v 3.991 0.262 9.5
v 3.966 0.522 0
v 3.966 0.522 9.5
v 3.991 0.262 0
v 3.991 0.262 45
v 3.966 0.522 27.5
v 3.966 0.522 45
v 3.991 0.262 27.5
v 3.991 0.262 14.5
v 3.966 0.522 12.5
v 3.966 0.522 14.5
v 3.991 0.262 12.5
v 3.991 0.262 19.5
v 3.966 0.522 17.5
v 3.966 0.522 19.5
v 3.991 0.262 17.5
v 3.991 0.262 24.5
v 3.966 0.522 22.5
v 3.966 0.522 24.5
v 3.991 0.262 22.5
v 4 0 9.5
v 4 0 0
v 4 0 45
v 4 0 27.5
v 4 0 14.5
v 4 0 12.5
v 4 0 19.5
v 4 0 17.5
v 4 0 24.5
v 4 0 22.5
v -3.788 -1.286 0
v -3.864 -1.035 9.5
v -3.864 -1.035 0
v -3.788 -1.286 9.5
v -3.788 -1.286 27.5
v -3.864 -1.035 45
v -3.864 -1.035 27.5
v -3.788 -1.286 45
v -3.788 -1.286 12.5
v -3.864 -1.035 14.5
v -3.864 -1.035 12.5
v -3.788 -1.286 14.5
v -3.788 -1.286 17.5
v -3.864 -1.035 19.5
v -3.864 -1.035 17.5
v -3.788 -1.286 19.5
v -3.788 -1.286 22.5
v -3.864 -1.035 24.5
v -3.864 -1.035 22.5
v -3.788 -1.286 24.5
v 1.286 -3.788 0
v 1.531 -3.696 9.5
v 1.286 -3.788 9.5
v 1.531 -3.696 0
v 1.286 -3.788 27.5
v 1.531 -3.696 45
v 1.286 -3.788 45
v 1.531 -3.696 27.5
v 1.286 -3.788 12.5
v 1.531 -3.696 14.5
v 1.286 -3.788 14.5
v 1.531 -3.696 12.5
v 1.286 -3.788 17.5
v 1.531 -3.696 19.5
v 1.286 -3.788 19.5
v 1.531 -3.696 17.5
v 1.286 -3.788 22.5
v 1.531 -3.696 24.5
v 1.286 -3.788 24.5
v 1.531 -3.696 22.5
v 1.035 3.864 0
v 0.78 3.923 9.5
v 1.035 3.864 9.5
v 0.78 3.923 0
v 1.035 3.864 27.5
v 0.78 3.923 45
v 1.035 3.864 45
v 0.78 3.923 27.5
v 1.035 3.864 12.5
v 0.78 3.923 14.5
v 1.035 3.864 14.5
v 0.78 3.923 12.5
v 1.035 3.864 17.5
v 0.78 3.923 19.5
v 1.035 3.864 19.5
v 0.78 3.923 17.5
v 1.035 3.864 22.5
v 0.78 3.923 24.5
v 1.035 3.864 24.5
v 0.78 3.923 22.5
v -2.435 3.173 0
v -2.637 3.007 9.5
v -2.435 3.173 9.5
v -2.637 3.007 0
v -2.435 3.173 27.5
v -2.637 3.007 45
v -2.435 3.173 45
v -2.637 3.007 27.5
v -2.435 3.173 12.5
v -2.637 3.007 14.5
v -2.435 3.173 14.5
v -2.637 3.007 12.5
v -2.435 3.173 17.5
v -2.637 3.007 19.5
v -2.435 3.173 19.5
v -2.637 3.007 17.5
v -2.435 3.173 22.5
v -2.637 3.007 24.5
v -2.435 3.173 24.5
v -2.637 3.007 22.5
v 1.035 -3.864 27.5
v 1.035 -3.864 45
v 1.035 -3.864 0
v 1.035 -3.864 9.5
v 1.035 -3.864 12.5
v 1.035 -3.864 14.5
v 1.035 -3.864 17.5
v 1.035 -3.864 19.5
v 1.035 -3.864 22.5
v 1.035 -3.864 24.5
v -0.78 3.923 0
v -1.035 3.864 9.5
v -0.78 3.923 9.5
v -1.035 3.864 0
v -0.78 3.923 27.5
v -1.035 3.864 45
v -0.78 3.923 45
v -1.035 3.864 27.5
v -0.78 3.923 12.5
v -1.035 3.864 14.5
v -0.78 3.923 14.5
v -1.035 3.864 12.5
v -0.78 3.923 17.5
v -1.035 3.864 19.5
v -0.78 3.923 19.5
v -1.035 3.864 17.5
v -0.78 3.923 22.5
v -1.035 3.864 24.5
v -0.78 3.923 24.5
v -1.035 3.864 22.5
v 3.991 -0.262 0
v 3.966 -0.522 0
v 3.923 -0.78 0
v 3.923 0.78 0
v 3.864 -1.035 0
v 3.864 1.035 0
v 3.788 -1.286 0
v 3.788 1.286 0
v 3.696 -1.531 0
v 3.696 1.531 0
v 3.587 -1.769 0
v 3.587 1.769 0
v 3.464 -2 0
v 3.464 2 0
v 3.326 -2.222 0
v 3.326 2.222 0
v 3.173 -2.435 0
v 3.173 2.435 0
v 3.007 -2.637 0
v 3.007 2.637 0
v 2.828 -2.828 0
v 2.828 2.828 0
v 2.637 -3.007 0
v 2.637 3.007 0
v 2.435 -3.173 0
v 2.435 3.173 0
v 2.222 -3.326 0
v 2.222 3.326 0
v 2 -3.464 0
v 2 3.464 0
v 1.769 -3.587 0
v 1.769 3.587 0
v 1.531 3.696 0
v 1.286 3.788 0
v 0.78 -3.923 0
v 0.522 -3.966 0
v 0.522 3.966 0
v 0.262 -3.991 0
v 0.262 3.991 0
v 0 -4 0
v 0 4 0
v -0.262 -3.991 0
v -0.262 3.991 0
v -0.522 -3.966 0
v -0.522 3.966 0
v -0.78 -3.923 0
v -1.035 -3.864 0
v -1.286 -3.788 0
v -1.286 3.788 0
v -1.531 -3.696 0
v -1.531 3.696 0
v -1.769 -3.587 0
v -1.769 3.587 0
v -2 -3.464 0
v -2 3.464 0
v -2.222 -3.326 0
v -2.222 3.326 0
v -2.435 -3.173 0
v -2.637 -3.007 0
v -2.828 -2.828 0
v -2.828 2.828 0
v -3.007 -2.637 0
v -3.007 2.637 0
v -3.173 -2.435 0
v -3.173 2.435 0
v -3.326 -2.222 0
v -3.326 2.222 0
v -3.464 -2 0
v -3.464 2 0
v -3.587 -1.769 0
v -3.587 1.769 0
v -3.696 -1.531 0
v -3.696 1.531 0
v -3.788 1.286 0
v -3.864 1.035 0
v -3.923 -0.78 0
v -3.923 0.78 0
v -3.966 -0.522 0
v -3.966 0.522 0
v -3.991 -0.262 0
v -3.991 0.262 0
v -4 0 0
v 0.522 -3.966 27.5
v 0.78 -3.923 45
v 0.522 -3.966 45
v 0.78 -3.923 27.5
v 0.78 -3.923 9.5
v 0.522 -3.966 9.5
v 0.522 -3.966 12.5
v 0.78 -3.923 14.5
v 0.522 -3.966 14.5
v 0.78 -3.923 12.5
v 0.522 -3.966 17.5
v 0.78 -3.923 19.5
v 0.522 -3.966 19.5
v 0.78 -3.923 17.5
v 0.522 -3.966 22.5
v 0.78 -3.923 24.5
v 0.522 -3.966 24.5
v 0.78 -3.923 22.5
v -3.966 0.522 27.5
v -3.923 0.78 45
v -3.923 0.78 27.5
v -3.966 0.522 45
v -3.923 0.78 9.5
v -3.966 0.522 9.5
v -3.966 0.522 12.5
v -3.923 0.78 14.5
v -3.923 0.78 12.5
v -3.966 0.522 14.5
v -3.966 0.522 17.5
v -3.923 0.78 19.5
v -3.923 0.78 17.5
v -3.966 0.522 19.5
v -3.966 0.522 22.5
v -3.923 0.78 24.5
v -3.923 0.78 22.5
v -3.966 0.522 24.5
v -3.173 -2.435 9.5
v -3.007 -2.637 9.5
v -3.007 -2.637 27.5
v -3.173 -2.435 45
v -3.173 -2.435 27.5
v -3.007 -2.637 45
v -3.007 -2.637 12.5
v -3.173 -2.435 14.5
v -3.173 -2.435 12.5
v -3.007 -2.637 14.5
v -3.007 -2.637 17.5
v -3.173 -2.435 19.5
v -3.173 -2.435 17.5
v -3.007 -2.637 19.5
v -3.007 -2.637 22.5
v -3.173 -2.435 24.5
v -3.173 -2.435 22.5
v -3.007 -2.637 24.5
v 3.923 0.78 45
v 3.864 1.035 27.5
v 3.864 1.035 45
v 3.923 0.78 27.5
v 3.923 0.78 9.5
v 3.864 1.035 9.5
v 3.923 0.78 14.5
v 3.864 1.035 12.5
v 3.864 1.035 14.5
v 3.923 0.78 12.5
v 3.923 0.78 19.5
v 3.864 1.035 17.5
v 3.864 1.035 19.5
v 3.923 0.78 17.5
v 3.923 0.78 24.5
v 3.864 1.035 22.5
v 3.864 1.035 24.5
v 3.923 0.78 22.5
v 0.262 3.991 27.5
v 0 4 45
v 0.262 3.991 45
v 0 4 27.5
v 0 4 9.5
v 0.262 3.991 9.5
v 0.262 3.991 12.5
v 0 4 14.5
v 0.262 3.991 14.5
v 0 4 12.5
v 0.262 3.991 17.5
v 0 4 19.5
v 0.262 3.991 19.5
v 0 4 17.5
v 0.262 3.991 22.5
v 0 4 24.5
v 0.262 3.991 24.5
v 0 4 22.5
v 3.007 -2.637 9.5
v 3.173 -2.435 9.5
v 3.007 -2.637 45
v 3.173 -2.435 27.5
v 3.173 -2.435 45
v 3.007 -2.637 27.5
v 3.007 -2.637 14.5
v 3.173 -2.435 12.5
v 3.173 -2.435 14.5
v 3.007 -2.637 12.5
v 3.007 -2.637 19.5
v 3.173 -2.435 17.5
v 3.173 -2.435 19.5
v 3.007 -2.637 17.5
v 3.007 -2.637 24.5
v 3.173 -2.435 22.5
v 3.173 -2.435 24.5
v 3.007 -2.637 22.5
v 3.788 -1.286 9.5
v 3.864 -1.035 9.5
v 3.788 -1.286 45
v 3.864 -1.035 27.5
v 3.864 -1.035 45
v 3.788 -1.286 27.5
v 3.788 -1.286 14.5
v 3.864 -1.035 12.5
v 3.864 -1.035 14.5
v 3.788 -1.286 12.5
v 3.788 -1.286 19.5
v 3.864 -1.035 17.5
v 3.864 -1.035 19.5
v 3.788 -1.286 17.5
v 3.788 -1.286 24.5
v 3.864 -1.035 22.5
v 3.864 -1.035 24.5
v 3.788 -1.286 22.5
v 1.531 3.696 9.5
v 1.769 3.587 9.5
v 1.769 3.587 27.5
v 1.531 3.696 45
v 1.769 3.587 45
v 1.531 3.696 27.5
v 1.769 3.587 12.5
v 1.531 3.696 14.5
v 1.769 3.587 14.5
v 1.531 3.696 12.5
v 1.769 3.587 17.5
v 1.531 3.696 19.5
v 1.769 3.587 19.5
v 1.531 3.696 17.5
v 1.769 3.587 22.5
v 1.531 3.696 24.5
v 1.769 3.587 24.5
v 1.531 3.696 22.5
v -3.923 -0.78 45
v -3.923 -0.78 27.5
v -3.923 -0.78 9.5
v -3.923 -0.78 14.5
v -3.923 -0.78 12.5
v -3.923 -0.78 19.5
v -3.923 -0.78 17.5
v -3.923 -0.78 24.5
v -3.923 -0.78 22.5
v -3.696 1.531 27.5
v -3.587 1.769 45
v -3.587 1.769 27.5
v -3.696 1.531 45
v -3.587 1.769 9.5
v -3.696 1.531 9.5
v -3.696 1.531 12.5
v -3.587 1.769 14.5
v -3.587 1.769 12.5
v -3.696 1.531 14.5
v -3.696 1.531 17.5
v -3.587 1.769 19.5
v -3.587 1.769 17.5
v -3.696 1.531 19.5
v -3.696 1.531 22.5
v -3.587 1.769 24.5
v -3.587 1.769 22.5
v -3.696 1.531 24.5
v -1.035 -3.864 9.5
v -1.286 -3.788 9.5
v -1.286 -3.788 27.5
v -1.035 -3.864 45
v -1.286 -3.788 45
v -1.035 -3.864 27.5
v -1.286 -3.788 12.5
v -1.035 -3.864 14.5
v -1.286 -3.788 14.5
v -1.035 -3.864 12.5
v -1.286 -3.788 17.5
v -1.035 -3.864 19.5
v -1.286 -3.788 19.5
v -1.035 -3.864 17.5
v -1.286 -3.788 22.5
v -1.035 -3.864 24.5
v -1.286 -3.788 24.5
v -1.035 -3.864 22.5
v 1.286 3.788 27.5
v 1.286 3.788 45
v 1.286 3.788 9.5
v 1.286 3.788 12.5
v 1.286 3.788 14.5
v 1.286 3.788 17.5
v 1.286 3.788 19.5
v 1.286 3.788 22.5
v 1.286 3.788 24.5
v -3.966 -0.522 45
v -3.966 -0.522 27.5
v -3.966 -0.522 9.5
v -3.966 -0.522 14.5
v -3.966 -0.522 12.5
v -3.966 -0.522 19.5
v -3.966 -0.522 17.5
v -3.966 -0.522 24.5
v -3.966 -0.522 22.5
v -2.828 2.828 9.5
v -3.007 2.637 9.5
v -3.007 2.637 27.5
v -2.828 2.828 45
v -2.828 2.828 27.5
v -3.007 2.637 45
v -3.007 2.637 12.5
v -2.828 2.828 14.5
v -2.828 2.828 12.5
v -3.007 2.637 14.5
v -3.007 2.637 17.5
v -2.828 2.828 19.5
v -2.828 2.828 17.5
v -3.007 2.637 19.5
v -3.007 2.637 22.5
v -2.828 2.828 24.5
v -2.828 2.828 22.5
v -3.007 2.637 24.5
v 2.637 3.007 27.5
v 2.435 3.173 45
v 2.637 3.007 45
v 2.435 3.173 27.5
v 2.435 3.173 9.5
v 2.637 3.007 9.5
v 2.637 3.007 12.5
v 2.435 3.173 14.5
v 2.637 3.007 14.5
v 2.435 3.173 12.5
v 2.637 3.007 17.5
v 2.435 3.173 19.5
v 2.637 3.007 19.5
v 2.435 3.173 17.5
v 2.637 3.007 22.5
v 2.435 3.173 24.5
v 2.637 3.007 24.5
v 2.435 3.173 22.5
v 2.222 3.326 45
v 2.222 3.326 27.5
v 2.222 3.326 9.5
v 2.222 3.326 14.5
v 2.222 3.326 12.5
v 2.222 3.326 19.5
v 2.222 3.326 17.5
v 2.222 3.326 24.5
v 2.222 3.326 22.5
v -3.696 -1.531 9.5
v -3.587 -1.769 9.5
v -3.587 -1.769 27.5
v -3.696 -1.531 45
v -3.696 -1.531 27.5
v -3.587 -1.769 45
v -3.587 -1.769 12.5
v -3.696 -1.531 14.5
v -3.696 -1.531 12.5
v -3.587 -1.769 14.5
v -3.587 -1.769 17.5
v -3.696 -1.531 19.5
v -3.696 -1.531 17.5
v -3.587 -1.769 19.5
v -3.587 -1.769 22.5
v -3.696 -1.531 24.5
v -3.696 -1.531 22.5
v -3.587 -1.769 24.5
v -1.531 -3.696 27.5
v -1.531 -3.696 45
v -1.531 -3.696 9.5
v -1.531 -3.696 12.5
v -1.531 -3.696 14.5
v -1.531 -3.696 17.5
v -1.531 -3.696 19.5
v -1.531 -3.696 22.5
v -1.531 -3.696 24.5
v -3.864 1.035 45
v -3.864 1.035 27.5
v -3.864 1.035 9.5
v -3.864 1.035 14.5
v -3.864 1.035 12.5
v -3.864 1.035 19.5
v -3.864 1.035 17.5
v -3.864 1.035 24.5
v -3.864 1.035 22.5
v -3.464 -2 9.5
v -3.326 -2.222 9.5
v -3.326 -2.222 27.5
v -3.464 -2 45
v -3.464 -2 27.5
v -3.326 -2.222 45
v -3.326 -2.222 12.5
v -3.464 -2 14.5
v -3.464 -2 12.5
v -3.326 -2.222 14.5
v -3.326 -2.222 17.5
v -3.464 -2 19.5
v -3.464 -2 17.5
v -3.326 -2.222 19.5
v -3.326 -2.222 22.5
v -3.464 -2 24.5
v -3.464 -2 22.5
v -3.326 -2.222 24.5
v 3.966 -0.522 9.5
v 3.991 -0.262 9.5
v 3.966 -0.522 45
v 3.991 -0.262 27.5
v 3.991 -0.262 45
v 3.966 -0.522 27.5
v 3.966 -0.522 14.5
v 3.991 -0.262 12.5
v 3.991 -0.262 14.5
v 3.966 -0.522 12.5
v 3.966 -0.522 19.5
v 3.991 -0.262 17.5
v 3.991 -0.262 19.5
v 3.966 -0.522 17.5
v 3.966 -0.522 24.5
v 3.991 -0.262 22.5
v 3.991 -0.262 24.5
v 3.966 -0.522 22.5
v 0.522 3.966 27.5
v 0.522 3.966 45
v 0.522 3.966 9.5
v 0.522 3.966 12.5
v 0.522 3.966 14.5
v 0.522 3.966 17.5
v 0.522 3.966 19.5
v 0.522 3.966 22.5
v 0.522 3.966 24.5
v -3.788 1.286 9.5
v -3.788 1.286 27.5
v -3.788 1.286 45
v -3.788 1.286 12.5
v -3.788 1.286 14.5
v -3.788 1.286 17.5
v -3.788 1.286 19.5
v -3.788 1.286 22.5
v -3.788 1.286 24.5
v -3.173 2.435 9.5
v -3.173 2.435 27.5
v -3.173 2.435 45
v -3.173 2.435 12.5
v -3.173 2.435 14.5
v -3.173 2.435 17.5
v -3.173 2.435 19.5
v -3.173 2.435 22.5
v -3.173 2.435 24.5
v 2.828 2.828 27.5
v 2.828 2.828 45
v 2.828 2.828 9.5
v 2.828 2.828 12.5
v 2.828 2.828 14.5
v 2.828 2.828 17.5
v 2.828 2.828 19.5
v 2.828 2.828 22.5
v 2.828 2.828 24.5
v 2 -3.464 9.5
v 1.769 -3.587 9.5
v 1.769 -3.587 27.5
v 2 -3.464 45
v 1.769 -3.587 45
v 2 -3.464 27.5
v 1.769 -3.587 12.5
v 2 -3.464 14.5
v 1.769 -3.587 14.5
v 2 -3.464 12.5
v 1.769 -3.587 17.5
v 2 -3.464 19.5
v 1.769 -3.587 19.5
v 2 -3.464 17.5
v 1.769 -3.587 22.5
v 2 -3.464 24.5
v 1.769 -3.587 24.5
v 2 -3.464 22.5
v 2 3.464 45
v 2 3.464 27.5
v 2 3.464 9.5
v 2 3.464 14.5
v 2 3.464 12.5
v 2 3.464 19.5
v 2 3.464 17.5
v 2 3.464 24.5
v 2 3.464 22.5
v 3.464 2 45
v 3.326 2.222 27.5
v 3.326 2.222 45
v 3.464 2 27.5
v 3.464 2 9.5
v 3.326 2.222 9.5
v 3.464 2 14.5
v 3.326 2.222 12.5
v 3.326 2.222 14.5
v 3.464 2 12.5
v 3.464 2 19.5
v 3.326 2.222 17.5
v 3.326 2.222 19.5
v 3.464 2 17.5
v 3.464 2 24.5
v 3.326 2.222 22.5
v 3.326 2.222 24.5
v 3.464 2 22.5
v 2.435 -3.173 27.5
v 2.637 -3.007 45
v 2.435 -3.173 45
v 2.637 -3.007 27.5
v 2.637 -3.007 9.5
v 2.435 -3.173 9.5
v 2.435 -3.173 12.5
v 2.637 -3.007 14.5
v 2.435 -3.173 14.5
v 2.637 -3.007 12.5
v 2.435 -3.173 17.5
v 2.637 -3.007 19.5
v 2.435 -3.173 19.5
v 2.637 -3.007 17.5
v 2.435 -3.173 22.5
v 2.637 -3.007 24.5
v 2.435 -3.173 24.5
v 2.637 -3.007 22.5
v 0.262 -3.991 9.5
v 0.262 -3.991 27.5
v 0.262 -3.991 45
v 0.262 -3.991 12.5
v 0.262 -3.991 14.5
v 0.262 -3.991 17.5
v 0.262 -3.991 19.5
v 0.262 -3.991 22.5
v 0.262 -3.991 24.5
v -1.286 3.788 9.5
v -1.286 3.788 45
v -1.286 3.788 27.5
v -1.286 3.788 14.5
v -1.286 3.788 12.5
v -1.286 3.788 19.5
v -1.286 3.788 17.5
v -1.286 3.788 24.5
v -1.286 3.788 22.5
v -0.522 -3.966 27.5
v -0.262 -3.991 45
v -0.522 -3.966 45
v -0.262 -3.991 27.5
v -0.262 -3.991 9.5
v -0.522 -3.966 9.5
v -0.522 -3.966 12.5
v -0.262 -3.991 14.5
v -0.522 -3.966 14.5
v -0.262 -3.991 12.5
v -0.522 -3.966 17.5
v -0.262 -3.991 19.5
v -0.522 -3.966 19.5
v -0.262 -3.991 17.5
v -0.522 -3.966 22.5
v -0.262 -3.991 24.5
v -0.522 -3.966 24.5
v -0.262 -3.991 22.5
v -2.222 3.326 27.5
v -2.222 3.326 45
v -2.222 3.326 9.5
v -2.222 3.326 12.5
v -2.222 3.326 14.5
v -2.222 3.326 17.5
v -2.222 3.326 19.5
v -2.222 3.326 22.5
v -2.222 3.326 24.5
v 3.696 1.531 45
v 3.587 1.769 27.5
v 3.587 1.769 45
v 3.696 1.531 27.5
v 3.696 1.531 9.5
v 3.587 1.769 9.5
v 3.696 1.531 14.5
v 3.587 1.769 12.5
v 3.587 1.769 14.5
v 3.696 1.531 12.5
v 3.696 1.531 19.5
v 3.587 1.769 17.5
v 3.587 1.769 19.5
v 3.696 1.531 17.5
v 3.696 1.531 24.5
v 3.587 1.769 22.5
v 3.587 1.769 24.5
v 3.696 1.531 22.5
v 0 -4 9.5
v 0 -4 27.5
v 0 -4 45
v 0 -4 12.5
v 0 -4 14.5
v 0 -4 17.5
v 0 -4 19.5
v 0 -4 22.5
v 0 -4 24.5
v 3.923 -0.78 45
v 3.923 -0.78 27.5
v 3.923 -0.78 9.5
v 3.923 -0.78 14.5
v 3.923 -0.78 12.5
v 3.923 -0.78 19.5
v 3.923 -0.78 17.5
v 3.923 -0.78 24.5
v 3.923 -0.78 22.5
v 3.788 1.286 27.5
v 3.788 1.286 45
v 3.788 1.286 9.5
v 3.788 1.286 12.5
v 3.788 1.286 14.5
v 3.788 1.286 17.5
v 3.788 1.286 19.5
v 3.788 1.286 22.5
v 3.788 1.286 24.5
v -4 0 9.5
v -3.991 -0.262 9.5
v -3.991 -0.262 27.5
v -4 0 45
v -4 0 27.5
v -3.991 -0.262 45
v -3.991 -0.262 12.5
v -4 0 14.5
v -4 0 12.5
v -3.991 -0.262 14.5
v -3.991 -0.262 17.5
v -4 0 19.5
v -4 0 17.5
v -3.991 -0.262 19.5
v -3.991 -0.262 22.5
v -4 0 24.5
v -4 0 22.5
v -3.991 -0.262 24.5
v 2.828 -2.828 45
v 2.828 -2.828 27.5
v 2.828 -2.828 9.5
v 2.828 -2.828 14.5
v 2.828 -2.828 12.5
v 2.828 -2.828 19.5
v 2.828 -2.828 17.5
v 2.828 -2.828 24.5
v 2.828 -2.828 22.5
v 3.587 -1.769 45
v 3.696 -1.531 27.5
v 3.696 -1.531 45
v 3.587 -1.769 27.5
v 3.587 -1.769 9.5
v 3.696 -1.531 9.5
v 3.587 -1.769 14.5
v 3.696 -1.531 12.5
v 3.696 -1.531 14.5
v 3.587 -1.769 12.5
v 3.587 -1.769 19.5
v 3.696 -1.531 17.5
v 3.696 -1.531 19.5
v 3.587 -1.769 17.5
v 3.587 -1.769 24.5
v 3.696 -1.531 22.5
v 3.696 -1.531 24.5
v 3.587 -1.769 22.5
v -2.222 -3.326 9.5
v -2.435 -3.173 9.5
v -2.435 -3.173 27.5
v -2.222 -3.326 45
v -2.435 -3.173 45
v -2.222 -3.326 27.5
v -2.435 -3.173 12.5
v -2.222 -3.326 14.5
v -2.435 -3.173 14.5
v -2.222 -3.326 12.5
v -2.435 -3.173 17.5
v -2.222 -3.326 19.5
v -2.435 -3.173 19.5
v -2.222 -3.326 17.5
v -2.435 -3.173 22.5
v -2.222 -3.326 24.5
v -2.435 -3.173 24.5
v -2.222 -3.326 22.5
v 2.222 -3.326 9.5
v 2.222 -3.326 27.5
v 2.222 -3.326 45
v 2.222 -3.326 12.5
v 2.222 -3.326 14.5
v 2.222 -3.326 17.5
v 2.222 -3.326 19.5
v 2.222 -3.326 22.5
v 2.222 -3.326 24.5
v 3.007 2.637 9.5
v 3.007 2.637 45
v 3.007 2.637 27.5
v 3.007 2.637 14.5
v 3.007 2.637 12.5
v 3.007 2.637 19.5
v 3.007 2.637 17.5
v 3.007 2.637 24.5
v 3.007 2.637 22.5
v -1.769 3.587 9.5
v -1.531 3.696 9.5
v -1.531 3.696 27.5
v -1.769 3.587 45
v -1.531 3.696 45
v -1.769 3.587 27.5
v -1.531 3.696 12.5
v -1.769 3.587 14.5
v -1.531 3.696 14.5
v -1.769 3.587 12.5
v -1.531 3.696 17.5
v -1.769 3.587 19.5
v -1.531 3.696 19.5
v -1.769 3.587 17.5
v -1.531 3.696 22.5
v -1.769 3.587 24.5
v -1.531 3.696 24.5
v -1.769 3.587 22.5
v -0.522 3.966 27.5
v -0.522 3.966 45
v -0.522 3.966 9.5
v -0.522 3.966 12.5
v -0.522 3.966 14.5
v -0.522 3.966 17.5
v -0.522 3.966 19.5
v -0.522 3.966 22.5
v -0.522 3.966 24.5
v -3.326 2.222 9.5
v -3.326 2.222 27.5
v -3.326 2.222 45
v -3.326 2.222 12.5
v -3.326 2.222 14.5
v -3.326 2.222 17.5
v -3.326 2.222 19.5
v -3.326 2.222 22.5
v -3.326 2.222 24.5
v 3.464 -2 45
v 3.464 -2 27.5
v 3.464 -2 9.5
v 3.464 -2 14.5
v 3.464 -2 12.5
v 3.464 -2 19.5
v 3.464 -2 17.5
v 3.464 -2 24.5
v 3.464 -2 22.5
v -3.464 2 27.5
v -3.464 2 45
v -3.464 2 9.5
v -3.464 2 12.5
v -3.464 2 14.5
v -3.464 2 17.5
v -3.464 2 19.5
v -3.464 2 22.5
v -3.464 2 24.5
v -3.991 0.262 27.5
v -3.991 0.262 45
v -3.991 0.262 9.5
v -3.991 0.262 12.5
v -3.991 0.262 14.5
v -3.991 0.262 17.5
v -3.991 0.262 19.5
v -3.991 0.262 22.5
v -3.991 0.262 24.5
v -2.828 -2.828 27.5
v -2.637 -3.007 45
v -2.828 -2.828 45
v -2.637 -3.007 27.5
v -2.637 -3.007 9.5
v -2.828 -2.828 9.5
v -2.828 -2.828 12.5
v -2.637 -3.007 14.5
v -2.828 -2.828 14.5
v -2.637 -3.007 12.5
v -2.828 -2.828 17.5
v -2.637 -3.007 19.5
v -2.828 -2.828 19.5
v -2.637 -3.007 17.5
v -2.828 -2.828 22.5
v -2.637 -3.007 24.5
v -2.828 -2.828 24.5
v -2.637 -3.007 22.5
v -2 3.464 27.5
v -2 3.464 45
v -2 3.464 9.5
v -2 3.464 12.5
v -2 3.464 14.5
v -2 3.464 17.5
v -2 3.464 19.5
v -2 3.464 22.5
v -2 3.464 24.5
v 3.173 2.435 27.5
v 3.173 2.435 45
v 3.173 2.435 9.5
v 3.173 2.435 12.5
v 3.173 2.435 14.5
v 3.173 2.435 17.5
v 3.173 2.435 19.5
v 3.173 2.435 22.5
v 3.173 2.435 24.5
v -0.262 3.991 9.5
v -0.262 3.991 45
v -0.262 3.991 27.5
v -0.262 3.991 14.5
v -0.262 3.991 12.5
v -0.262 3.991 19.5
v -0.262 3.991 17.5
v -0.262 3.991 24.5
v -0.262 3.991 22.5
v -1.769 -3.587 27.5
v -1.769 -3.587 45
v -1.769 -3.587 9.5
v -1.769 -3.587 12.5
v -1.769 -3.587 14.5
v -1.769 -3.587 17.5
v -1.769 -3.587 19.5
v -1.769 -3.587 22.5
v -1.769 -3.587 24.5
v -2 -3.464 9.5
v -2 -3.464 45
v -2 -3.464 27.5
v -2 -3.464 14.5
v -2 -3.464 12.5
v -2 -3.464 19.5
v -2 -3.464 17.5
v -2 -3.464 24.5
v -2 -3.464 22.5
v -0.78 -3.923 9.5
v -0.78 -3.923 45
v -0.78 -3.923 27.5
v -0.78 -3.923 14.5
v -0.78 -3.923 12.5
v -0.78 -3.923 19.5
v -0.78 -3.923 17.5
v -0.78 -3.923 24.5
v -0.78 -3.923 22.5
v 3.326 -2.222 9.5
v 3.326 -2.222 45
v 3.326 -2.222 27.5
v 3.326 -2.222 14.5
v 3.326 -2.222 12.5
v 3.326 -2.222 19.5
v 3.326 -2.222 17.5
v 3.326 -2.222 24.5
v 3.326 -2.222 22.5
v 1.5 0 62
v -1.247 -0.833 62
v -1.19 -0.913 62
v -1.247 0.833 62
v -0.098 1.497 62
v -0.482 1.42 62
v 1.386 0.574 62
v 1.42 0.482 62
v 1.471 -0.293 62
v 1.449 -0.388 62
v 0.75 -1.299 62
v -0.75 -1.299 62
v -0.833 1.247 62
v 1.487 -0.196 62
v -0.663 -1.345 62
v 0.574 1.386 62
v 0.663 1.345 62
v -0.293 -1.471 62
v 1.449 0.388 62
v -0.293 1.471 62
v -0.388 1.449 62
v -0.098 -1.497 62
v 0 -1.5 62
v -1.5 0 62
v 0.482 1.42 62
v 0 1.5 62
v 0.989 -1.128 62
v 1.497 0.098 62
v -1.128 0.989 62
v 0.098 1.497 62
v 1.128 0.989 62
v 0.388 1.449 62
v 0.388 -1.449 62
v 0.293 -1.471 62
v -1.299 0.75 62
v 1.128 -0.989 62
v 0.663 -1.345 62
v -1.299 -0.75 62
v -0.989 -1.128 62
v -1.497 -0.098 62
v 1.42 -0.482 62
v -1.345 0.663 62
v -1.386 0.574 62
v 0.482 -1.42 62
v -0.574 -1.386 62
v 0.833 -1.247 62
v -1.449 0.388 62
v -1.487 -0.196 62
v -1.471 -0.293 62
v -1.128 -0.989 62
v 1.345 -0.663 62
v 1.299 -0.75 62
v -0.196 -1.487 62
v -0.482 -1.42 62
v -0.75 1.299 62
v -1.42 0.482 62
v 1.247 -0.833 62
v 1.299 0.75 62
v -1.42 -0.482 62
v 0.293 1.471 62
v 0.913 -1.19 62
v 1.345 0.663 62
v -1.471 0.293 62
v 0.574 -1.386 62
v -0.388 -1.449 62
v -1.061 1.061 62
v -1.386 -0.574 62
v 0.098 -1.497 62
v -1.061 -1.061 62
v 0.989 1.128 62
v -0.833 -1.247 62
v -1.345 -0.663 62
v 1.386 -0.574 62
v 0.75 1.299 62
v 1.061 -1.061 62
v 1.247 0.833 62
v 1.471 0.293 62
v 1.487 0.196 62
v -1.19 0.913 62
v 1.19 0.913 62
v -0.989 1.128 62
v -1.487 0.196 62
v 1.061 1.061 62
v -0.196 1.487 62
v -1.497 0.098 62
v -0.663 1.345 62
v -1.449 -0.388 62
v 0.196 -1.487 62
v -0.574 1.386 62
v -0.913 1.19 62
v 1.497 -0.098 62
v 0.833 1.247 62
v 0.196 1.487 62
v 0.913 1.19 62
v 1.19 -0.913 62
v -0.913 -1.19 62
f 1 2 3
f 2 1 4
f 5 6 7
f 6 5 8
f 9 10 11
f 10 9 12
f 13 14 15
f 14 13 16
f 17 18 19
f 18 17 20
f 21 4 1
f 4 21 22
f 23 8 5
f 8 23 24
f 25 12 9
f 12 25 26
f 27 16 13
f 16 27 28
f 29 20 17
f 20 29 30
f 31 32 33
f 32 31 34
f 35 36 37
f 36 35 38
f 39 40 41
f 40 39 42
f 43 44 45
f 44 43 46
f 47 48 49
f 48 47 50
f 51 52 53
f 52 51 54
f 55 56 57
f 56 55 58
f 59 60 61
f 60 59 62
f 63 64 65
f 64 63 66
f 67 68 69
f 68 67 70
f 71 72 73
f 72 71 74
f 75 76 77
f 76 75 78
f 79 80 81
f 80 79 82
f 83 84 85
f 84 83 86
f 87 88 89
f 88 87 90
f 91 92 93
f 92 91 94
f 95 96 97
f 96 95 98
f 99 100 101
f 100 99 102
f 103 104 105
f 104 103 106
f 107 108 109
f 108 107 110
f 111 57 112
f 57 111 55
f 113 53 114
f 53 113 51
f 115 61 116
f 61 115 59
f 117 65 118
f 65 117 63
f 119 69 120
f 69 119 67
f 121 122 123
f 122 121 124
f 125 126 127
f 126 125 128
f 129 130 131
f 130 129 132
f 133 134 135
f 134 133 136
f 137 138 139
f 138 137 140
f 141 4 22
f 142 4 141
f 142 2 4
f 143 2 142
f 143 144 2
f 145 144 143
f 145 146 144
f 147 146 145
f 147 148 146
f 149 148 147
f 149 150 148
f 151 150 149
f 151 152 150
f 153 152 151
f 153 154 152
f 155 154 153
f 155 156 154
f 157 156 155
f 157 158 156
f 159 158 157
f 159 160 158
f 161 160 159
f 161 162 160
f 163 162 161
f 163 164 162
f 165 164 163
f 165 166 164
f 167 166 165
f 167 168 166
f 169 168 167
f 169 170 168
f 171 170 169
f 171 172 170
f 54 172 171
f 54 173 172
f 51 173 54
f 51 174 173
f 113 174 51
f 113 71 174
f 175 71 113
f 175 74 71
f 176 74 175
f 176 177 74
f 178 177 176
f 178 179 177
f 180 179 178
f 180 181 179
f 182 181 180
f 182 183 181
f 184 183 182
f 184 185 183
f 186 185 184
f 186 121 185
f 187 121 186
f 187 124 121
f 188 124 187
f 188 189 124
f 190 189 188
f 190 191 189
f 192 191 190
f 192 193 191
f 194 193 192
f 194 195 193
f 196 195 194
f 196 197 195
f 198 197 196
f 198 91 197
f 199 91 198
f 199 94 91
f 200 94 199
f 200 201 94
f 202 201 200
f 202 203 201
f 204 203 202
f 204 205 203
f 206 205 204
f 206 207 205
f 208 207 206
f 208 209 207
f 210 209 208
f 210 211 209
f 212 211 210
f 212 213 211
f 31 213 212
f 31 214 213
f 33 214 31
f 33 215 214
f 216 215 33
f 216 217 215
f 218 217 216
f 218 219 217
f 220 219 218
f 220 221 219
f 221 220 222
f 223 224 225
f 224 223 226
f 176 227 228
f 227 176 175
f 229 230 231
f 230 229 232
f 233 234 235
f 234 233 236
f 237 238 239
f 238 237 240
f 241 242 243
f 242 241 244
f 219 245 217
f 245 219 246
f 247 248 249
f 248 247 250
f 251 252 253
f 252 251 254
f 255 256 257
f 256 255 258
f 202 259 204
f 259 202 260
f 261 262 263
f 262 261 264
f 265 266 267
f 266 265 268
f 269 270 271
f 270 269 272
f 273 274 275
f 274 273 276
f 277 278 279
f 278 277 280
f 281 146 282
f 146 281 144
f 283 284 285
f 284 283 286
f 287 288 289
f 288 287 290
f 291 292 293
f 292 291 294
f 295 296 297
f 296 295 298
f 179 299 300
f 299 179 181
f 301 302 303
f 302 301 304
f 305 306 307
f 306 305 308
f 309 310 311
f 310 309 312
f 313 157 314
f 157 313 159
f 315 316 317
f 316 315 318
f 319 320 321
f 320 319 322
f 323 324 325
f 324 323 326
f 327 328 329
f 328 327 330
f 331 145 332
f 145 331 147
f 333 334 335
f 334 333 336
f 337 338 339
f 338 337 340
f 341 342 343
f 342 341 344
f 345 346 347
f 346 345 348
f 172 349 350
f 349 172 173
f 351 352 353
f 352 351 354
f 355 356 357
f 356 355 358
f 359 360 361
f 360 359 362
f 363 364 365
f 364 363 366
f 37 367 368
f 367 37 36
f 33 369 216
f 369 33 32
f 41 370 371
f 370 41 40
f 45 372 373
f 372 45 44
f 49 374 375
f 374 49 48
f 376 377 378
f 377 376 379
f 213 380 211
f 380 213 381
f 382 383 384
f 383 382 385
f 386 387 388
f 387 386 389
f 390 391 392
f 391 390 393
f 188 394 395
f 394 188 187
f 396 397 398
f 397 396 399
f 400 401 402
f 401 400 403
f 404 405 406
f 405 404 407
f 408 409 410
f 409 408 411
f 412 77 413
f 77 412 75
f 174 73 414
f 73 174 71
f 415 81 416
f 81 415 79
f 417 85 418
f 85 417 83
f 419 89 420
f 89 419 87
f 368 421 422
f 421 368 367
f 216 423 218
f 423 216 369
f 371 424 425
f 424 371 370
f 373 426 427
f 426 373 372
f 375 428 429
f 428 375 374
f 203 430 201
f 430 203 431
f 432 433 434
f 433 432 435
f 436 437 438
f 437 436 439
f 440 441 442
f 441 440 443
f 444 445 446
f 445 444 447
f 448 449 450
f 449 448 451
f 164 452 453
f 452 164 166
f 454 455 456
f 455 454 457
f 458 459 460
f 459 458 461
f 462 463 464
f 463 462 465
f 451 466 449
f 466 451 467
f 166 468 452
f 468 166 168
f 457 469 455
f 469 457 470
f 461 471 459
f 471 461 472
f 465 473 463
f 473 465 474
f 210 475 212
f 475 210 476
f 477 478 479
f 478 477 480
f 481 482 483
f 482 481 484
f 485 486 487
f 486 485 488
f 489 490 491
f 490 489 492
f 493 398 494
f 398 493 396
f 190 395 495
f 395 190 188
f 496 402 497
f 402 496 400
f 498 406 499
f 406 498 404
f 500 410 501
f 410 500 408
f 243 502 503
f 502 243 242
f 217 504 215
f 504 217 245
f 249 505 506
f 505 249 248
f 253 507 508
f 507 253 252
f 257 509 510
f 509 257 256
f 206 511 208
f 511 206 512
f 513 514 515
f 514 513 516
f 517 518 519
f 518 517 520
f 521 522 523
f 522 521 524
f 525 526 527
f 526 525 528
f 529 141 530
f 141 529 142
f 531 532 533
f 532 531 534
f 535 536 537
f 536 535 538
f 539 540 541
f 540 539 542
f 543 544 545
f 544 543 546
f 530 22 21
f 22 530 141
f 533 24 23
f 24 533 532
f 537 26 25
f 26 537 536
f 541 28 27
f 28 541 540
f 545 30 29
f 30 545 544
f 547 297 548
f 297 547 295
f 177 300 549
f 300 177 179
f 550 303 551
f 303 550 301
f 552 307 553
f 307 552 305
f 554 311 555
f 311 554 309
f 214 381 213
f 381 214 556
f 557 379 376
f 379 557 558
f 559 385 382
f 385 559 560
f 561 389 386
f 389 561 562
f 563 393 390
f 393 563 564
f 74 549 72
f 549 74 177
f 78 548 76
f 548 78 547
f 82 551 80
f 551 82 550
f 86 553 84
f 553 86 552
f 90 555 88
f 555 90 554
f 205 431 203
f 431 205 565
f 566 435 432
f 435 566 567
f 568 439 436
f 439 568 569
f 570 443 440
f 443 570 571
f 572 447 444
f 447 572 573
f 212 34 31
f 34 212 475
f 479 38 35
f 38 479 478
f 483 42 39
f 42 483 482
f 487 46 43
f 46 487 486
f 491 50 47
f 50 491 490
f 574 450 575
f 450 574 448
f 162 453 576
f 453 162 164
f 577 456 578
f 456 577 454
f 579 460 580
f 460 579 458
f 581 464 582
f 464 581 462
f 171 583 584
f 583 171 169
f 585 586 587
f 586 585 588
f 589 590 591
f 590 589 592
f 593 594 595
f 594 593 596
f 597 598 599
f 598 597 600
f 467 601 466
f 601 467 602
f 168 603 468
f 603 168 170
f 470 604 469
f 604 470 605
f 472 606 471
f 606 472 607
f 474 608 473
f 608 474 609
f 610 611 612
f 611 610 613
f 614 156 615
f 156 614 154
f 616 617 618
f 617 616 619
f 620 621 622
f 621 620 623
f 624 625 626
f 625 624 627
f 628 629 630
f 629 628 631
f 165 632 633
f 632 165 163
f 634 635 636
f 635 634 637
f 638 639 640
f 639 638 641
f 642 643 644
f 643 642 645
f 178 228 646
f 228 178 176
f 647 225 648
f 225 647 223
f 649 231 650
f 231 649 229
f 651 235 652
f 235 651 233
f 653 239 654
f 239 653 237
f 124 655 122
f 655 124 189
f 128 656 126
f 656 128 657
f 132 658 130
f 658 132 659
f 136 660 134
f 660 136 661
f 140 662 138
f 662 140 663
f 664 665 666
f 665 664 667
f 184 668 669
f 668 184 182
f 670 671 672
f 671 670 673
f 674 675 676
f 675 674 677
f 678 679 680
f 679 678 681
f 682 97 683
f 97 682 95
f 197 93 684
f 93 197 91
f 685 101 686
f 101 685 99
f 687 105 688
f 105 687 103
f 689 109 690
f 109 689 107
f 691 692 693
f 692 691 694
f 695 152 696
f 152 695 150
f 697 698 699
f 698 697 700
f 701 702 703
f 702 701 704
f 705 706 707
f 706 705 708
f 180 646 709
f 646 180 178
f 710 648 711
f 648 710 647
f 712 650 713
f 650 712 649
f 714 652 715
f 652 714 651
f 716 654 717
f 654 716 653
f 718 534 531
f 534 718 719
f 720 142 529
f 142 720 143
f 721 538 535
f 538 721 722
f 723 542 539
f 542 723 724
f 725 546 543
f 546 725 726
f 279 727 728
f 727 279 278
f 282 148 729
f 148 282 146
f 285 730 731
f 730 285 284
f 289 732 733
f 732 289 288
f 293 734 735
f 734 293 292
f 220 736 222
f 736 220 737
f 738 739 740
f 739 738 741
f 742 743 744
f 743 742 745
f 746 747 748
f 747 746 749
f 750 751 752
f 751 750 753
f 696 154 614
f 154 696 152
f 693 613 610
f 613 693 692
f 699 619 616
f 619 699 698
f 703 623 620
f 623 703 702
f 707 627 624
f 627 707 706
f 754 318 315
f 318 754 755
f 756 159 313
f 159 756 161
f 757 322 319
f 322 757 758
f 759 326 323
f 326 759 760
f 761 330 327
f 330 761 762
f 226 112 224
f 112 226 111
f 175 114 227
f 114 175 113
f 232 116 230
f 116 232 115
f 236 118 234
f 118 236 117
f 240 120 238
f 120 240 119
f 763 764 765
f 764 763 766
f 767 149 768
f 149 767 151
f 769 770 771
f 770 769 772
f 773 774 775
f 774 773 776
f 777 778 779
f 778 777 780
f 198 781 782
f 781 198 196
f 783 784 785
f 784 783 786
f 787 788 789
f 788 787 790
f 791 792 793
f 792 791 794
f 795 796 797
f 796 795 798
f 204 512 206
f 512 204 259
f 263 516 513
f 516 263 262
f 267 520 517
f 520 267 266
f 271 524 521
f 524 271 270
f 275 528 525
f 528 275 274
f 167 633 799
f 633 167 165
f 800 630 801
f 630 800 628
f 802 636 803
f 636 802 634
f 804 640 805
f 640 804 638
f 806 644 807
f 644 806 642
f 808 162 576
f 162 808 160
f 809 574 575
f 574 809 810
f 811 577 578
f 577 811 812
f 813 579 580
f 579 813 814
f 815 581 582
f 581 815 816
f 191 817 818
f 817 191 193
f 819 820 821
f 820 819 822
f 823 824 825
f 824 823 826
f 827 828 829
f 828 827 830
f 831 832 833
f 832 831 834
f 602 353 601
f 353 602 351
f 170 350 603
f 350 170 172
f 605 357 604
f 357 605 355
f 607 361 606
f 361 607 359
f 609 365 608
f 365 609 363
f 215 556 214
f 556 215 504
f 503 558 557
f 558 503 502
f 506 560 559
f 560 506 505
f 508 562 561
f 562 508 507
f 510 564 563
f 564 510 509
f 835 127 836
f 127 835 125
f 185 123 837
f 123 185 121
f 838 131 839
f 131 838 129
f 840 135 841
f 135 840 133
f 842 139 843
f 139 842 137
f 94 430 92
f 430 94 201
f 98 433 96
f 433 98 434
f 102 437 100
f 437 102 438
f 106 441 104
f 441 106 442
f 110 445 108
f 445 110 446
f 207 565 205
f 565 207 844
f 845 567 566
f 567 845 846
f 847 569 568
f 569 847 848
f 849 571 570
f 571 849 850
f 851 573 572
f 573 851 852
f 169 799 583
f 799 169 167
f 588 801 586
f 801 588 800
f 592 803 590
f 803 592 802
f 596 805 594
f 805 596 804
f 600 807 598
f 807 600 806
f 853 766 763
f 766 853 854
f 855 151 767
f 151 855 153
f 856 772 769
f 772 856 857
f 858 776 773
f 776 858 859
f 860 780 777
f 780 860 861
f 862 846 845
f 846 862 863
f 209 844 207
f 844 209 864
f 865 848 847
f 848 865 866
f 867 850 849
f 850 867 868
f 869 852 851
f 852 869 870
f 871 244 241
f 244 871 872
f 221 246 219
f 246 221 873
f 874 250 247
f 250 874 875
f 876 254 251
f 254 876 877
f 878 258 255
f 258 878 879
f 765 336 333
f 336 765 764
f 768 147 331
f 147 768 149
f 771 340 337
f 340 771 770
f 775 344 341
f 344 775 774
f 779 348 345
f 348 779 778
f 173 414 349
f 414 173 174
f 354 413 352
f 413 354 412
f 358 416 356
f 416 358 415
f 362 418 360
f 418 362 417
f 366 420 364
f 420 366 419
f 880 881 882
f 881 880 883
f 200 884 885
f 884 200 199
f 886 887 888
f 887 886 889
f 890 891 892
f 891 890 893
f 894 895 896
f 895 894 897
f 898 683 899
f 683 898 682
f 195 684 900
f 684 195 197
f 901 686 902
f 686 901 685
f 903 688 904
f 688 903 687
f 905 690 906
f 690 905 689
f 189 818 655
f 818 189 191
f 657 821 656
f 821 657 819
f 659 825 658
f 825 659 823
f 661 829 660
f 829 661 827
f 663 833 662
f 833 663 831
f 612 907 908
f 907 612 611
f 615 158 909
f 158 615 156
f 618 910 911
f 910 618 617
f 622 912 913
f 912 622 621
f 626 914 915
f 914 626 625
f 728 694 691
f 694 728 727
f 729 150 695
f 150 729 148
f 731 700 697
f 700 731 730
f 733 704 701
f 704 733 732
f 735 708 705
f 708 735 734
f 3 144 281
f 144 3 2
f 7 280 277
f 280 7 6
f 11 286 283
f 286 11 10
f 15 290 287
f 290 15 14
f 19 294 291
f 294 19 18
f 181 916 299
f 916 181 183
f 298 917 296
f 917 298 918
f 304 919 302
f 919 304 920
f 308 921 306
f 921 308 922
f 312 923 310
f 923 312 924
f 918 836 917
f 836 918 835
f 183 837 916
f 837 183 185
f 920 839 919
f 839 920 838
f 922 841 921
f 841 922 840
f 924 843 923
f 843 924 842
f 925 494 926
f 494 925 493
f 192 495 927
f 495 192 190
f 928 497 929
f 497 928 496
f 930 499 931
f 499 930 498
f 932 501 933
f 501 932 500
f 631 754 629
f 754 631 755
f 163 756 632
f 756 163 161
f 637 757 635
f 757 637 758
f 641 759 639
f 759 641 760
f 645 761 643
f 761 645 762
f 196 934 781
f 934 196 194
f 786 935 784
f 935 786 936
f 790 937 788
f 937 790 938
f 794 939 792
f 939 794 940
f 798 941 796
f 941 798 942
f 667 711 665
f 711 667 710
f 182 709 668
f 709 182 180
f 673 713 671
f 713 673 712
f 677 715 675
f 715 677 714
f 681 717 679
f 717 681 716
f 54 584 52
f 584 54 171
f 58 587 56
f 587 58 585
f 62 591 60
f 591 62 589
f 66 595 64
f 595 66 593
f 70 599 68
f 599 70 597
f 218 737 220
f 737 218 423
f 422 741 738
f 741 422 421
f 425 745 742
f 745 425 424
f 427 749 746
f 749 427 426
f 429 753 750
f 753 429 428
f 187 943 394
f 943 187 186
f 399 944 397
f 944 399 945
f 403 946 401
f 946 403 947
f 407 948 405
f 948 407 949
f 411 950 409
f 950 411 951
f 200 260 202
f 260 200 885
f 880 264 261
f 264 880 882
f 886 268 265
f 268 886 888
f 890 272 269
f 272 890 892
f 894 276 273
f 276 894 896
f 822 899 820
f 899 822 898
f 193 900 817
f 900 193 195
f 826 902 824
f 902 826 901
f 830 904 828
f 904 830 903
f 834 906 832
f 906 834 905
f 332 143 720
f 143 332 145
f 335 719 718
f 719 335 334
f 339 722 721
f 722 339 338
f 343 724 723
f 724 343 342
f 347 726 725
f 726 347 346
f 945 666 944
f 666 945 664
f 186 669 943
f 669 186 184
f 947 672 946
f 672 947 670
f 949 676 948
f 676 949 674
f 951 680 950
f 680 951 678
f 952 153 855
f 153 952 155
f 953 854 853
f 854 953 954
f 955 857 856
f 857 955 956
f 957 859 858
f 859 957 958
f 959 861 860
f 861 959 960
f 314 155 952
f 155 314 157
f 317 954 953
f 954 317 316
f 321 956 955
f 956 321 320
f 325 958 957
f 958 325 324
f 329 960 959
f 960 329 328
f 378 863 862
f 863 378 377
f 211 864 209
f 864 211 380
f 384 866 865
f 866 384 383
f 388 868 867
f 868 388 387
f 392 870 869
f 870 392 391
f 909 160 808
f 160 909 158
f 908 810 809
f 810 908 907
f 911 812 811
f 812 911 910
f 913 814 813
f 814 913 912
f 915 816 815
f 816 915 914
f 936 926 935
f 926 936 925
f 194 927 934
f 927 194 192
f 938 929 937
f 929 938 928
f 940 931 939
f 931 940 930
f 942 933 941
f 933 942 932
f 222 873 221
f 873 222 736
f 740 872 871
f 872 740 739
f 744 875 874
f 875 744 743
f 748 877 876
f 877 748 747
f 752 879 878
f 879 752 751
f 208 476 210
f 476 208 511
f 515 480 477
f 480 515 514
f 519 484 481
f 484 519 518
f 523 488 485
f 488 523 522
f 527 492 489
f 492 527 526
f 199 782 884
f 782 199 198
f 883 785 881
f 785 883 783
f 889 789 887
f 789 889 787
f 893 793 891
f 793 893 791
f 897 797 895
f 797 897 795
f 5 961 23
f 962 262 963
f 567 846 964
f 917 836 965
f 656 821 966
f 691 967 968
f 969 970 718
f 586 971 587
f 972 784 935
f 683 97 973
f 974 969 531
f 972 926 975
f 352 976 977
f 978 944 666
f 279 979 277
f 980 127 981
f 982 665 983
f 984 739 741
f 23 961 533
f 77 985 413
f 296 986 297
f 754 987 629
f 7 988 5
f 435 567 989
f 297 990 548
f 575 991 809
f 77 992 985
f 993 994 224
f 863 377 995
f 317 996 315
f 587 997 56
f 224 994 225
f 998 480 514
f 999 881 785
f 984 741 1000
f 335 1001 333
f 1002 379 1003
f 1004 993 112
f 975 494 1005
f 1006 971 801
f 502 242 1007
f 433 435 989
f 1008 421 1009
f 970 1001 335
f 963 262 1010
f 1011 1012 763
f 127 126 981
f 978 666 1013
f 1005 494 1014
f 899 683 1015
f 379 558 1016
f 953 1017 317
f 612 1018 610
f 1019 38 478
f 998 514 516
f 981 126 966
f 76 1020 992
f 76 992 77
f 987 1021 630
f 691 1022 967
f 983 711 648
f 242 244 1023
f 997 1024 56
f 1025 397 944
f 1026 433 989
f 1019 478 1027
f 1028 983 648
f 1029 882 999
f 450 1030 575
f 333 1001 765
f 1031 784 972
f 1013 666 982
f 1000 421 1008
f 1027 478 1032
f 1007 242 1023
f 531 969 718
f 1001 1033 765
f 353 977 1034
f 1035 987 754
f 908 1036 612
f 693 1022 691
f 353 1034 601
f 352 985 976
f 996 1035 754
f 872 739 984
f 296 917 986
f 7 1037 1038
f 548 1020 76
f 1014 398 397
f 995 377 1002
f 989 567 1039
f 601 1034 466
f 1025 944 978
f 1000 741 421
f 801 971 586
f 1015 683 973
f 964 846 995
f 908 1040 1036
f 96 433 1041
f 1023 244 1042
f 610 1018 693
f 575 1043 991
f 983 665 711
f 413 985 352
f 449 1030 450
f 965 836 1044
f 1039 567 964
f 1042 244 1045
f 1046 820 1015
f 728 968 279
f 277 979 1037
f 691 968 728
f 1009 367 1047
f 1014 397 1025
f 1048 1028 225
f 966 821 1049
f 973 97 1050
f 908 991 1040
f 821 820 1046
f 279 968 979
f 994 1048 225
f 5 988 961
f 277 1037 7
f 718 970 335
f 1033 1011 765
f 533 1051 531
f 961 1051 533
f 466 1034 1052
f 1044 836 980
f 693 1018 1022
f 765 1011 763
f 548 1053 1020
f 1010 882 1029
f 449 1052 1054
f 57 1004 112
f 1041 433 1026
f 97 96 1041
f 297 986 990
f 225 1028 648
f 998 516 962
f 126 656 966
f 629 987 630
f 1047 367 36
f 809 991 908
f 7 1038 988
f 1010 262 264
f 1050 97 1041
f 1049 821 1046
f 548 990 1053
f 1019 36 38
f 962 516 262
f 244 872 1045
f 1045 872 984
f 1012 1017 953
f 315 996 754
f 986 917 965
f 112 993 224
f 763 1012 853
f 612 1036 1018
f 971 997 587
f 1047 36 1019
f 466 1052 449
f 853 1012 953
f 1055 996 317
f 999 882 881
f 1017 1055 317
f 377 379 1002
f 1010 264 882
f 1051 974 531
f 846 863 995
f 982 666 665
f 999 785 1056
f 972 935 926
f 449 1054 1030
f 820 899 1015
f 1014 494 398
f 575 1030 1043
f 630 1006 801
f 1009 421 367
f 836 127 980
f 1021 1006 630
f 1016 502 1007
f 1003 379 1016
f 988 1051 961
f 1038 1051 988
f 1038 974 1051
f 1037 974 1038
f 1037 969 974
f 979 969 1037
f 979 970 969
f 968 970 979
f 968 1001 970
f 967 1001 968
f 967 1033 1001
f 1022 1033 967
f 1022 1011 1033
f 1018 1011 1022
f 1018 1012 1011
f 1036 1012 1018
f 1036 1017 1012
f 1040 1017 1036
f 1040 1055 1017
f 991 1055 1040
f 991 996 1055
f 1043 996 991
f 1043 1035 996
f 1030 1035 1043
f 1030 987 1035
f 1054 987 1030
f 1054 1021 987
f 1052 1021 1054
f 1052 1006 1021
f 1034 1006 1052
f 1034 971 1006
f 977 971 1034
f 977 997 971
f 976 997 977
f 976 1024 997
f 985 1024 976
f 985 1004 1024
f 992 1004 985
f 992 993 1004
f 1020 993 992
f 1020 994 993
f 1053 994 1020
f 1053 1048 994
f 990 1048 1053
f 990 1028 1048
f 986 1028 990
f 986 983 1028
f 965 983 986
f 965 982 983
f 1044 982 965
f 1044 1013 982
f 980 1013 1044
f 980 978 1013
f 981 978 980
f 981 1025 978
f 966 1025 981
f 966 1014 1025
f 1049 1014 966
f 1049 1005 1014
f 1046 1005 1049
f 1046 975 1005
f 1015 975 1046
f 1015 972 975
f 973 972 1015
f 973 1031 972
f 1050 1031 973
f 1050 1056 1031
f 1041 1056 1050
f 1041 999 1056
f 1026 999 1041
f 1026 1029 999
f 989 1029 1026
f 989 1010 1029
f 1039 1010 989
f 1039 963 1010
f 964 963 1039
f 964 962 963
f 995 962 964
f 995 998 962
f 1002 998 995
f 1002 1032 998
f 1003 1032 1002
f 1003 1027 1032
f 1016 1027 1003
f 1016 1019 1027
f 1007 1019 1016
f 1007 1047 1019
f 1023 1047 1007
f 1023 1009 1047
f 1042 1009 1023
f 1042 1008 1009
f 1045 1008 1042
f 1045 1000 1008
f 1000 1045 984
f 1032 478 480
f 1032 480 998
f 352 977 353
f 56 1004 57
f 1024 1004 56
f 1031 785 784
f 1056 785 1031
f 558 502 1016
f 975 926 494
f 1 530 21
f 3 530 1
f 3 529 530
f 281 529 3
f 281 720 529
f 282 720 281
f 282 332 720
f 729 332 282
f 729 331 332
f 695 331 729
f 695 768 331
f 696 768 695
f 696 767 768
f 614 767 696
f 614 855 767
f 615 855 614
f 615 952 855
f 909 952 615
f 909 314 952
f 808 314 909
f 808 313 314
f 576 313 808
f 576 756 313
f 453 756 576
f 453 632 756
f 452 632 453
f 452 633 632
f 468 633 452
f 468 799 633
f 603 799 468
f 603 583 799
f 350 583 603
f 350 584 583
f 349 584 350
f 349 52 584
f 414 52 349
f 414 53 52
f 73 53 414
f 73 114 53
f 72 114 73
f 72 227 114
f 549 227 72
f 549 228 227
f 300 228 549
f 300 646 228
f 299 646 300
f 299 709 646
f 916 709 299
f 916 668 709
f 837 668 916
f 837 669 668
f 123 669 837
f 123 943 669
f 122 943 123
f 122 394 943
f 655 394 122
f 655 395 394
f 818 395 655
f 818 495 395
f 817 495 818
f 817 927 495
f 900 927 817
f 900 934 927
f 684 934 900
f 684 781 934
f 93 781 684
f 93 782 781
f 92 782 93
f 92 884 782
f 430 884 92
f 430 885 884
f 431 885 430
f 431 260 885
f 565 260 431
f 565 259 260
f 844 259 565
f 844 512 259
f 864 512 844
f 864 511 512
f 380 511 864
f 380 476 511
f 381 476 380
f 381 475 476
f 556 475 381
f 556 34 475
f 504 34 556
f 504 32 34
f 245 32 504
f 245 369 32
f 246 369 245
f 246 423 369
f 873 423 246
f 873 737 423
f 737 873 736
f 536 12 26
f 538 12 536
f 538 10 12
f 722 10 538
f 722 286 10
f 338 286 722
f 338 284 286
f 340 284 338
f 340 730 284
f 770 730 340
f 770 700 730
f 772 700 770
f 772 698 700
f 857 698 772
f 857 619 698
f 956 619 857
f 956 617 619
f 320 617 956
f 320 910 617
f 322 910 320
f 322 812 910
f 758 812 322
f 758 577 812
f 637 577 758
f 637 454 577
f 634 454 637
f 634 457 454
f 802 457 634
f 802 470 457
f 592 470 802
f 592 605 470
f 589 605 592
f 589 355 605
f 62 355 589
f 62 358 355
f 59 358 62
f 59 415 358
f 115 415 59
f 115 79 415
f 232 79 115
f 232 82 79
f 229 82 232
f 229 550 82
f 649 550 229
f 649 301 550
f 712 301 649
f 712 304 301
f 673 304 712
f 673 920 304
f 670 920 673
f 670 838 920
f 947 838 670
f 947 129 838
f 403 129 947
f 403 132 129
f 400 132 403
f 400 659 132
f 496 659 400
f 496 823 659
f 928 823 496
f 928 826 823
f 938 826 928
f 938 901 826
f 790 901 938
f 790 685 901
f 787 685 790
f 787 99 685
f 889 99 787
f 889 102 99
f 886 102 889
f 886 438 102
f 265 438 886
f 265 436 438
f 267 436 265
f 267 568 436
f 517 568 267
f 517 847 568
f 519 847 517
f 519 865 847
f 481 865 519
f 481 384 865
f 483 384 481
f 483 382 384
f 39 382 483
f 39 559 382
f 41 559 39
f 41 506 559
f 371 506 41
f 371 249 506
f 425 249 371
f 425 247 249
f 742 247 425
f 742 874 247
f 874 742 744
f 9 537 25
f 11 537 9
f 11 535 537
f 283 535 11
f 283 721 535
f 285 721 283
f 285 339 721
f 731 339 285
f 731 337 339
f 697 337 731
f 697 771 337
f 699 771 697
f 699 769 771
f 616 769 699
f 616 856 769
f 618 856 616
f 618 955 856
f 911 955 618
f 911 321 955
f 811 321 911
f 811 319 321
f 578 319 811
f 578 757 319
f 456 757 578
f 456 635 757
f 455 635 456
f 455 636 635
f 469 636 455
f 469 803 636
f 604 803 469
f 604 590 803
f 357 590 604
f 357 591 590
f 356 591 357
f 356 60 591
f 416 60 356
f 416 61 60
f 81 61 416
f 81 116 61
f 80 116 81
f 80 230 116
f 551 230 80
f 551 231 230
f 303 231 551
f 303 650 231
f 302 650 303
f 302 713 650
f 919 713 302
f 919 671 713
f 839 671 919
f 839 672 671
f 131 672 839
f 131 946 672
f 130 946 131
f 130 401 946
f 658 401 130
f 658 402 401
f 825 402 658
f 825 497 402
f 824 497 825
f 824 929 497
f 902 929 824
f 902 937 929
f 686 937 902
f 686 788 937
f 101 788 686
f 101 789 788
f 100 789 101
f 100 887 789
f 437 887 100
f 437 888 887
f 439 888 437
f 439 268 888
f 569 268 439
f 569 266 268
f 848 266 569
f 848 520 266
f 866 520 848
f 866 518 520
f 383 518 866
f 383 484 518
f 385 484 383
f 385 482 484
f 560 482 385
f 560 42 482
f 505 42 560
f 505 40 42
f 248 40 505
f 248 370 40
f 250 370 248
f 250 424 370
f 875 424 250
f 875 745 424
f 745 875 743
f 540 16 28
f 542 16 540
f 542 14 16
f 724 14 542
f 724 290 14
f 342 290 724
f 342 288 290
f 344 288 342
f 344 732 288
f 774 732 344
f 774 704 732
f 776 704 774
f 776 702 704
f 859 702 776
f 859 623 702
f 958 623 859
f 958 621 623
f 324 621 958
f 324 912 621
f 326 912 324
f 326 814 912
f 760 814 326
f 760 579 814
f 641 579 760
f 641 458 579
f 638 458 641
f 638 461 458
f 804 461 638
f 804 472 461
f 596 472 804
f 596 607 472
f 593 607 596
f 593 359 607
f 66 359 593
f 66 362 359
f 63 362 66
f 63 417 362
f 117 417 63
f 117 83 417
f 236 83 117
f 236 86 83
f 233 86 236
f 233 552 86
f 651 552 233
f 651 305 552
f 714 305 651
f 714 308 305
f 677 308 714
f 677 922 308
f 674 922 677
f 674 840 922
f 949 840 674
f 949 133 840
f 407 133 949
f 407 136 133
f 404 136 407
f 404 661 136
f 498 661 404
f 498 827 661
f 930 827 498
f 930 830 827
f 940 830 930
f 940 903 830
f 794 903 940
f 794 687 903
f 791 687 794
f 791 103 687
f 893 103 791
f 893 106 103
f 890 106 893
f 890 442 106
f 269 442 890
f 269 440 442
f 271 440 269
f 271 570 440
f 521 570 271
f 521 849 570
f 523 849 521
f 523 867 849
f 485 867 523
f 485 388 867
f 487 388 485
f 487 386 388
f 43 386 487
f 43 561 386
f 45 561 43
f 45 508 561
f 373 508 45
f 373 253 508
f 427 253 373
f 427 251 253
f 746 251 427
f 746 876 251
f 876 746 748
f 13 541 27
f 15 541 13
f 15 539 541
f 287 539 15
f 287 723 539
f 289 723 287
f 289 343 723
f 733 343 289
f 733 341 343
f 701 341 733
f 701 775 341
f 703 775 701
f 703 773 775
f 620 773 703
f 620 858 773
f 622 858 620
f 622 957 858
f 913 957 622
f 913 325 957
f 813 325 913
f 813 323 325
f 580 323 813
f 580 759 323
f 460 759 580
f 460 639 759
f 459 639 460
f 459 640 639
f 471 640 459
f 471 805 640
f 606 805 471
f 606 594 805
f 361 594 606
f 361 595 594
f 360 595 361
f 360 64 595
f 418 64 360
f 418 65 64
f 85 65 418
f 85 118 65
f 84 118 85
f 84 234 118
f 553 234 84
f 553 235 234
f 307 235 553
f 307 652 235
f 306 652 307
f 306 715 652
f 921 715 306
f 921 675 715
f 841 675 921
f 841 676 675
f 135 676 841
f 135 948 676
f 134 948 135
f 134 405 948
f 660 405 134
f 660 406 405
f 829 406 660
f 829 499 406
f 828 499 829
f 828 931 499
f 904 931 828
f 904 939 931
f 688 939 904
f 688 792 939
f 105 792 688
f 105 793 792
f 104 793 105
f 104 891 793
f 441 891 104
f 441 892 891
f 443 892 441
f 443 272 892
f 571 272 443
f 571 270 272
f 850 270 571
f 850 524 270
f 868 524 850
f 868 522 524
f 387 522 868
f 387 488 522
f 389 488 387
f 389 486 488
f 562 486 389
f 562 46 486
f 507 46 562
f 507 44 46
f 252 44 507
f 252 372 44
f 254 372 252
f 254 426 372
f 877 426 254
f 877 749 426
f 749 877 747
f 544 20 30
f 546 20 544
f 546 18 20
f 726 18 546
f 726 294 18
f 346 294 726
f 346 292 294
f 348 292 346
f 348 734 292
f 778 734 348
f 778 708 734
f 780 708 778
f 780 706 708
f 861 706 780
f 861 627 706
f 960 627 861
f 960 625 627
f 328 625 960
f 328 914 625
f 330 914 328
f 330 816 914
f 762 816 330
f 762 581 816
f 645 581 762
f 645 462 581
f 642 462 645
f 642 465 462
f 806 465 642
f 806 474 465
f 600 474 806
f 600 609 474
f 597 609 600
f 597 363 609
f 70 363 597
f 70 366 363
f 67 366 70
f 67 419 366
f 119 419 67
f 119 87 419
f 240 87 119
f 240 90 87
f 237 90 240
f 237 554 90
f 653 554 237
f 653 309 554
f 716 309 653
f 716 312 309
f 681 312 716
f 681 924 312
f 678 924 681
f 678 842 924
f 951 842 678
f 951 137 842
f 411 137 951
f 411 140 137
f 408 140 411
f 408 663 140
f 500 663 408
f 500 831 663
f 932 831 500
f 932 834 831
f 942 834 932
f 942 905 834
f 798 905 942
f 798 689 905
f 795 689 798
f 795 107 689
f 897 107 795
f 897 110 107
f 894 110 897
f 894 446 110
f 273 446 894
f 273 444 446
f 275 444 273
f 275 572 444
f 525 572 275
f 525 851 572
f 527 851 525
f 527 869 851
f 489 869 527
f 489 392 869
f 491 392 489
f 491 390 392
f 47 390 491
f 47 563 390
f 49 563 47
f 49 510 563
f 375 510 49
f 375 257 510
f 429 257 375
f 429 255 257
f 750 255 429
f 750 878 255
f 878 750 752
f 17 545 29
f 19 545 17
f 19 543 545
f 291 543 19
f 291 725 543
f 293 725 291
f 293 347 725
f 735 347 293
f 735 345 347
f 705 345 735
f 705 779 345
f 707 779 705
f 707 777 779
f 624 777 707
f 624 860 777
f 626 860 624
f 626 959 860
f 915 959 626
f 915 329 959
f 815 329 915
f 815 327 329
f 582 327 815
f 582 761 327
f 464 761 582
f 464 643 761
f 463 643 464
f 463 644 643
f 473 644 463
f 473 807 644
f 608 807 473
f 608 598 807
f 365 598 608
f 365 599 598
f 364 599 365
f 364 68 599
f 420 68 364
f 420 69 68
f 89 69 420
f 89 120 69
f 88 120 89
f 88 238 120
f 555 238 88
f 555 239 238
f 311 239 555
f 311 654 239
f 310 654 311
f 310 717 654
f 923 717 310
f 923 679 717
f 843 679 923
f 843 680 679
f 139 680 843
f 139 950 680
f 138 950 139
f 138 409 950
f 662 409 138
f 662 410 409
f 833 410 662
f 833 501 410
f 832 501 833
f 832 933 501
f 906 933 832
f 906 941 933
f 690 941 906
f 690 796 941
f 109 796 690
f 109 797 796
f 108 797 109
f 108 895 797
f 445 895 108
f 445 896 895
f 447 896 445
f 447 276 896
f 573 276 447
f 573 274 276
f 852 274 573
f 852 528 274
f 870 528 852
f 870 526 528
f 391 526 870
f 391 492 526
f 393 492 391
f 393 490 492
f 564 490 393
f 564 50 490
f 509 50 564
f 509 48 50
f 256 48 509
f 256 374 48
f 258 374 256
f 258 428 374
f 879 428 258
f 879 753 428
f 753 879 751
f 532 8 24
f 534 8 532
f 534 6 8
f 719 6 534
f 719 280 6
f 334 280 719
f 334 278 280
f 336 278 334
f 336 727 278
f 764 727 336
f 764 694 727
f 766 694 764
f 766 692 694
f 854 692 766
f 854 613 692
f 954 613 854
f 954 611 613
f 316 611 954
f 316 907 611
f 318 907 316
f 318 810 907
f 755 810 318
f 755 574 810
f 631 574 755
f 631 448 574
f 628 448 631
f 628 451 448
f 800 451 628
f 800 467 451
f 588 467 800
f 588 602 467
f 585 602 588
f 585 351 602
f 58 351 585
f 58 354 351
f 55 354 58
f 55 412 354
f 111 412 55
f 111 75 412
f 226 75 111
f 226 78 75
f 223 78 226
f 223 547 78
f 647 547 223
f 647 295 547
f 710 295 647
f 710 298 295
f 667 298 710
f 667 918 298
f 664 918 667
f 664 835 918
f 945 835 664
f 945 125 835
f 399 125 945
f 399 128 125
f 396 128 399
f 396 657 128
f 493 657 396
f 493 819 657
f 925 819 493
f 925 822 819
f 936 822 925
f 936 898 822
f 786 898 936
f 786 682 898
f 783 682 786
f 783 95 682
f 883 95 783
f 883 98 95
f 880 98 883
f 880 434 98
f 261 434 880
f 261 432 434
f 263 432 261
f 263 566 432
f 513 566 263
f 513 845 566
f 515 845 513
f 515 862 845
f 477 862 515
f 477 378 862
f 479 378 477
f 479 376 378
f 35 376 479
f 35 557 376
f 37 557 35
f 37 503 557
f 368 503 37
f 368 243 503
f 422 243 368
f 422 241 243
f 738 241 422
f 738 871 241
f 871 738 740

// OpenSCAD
// Pestle for grinding tissue in a 1.5 mL microcentrifuge tube
// Print orientation: standing upright on the bed (z = 0)

// ---------------- Parameters ----------------
handle_d      = 8;    // handle diameter (mm)
handle_h      = 45;   // handle height (mm), z = 0 to 45
cone_start_d  = 8;    // cone diameter at z = handle_h (mm)
cone_end_d    = 3;    // cone diameter at cone tip (mm)
cone_tip_z    = 62;   // cone tip height (mm)
tip_d         = 3;    // rounded tip diameter (mm)
tip_centre_z  = 62;   // rounded tip sphere centre (mm)
groove_w      = 2;    // groove width (mm), measured in Z
groove_depth  = 1;    // groove depth (mm), removed from surface
groove_z      = [10, 15, 20, 25]; // groove centre heights (mm)
eps           = 0.5;  // cutter overshoot past faces (mm)
$fn           = 96;   // curve resolution

// ---------------- Model ----------------
difference() {
    union() {
        // (1) Cylindrical handle
        cylinder(d = handle_d, h = handle_h);

        // (2) Tapering cone: cone_start_d at z = handle_h to cone_end_d at z = cone_tip_z
        translate([0, 0, handle_h])
            cylinder(d1 = cone_start_d, d2 = cone_end_d, h = cone_tip_z - handle_h);

        // (3) Rounded tip: sphere of diameter tip_d centred at z = tip_centre_z
        translate([0, 0, tip_centre_z - tip_d / 2])
            sphere(d = tip_d);
    }

    // Grip grooves: circumferential cuts around the handle
    for (gz = groove_z)
        translate([0, 0, gz - eps])
            cylinder(d = handle_d + 2 * groove_depth, h = groove_w + 2 * eps);
}
